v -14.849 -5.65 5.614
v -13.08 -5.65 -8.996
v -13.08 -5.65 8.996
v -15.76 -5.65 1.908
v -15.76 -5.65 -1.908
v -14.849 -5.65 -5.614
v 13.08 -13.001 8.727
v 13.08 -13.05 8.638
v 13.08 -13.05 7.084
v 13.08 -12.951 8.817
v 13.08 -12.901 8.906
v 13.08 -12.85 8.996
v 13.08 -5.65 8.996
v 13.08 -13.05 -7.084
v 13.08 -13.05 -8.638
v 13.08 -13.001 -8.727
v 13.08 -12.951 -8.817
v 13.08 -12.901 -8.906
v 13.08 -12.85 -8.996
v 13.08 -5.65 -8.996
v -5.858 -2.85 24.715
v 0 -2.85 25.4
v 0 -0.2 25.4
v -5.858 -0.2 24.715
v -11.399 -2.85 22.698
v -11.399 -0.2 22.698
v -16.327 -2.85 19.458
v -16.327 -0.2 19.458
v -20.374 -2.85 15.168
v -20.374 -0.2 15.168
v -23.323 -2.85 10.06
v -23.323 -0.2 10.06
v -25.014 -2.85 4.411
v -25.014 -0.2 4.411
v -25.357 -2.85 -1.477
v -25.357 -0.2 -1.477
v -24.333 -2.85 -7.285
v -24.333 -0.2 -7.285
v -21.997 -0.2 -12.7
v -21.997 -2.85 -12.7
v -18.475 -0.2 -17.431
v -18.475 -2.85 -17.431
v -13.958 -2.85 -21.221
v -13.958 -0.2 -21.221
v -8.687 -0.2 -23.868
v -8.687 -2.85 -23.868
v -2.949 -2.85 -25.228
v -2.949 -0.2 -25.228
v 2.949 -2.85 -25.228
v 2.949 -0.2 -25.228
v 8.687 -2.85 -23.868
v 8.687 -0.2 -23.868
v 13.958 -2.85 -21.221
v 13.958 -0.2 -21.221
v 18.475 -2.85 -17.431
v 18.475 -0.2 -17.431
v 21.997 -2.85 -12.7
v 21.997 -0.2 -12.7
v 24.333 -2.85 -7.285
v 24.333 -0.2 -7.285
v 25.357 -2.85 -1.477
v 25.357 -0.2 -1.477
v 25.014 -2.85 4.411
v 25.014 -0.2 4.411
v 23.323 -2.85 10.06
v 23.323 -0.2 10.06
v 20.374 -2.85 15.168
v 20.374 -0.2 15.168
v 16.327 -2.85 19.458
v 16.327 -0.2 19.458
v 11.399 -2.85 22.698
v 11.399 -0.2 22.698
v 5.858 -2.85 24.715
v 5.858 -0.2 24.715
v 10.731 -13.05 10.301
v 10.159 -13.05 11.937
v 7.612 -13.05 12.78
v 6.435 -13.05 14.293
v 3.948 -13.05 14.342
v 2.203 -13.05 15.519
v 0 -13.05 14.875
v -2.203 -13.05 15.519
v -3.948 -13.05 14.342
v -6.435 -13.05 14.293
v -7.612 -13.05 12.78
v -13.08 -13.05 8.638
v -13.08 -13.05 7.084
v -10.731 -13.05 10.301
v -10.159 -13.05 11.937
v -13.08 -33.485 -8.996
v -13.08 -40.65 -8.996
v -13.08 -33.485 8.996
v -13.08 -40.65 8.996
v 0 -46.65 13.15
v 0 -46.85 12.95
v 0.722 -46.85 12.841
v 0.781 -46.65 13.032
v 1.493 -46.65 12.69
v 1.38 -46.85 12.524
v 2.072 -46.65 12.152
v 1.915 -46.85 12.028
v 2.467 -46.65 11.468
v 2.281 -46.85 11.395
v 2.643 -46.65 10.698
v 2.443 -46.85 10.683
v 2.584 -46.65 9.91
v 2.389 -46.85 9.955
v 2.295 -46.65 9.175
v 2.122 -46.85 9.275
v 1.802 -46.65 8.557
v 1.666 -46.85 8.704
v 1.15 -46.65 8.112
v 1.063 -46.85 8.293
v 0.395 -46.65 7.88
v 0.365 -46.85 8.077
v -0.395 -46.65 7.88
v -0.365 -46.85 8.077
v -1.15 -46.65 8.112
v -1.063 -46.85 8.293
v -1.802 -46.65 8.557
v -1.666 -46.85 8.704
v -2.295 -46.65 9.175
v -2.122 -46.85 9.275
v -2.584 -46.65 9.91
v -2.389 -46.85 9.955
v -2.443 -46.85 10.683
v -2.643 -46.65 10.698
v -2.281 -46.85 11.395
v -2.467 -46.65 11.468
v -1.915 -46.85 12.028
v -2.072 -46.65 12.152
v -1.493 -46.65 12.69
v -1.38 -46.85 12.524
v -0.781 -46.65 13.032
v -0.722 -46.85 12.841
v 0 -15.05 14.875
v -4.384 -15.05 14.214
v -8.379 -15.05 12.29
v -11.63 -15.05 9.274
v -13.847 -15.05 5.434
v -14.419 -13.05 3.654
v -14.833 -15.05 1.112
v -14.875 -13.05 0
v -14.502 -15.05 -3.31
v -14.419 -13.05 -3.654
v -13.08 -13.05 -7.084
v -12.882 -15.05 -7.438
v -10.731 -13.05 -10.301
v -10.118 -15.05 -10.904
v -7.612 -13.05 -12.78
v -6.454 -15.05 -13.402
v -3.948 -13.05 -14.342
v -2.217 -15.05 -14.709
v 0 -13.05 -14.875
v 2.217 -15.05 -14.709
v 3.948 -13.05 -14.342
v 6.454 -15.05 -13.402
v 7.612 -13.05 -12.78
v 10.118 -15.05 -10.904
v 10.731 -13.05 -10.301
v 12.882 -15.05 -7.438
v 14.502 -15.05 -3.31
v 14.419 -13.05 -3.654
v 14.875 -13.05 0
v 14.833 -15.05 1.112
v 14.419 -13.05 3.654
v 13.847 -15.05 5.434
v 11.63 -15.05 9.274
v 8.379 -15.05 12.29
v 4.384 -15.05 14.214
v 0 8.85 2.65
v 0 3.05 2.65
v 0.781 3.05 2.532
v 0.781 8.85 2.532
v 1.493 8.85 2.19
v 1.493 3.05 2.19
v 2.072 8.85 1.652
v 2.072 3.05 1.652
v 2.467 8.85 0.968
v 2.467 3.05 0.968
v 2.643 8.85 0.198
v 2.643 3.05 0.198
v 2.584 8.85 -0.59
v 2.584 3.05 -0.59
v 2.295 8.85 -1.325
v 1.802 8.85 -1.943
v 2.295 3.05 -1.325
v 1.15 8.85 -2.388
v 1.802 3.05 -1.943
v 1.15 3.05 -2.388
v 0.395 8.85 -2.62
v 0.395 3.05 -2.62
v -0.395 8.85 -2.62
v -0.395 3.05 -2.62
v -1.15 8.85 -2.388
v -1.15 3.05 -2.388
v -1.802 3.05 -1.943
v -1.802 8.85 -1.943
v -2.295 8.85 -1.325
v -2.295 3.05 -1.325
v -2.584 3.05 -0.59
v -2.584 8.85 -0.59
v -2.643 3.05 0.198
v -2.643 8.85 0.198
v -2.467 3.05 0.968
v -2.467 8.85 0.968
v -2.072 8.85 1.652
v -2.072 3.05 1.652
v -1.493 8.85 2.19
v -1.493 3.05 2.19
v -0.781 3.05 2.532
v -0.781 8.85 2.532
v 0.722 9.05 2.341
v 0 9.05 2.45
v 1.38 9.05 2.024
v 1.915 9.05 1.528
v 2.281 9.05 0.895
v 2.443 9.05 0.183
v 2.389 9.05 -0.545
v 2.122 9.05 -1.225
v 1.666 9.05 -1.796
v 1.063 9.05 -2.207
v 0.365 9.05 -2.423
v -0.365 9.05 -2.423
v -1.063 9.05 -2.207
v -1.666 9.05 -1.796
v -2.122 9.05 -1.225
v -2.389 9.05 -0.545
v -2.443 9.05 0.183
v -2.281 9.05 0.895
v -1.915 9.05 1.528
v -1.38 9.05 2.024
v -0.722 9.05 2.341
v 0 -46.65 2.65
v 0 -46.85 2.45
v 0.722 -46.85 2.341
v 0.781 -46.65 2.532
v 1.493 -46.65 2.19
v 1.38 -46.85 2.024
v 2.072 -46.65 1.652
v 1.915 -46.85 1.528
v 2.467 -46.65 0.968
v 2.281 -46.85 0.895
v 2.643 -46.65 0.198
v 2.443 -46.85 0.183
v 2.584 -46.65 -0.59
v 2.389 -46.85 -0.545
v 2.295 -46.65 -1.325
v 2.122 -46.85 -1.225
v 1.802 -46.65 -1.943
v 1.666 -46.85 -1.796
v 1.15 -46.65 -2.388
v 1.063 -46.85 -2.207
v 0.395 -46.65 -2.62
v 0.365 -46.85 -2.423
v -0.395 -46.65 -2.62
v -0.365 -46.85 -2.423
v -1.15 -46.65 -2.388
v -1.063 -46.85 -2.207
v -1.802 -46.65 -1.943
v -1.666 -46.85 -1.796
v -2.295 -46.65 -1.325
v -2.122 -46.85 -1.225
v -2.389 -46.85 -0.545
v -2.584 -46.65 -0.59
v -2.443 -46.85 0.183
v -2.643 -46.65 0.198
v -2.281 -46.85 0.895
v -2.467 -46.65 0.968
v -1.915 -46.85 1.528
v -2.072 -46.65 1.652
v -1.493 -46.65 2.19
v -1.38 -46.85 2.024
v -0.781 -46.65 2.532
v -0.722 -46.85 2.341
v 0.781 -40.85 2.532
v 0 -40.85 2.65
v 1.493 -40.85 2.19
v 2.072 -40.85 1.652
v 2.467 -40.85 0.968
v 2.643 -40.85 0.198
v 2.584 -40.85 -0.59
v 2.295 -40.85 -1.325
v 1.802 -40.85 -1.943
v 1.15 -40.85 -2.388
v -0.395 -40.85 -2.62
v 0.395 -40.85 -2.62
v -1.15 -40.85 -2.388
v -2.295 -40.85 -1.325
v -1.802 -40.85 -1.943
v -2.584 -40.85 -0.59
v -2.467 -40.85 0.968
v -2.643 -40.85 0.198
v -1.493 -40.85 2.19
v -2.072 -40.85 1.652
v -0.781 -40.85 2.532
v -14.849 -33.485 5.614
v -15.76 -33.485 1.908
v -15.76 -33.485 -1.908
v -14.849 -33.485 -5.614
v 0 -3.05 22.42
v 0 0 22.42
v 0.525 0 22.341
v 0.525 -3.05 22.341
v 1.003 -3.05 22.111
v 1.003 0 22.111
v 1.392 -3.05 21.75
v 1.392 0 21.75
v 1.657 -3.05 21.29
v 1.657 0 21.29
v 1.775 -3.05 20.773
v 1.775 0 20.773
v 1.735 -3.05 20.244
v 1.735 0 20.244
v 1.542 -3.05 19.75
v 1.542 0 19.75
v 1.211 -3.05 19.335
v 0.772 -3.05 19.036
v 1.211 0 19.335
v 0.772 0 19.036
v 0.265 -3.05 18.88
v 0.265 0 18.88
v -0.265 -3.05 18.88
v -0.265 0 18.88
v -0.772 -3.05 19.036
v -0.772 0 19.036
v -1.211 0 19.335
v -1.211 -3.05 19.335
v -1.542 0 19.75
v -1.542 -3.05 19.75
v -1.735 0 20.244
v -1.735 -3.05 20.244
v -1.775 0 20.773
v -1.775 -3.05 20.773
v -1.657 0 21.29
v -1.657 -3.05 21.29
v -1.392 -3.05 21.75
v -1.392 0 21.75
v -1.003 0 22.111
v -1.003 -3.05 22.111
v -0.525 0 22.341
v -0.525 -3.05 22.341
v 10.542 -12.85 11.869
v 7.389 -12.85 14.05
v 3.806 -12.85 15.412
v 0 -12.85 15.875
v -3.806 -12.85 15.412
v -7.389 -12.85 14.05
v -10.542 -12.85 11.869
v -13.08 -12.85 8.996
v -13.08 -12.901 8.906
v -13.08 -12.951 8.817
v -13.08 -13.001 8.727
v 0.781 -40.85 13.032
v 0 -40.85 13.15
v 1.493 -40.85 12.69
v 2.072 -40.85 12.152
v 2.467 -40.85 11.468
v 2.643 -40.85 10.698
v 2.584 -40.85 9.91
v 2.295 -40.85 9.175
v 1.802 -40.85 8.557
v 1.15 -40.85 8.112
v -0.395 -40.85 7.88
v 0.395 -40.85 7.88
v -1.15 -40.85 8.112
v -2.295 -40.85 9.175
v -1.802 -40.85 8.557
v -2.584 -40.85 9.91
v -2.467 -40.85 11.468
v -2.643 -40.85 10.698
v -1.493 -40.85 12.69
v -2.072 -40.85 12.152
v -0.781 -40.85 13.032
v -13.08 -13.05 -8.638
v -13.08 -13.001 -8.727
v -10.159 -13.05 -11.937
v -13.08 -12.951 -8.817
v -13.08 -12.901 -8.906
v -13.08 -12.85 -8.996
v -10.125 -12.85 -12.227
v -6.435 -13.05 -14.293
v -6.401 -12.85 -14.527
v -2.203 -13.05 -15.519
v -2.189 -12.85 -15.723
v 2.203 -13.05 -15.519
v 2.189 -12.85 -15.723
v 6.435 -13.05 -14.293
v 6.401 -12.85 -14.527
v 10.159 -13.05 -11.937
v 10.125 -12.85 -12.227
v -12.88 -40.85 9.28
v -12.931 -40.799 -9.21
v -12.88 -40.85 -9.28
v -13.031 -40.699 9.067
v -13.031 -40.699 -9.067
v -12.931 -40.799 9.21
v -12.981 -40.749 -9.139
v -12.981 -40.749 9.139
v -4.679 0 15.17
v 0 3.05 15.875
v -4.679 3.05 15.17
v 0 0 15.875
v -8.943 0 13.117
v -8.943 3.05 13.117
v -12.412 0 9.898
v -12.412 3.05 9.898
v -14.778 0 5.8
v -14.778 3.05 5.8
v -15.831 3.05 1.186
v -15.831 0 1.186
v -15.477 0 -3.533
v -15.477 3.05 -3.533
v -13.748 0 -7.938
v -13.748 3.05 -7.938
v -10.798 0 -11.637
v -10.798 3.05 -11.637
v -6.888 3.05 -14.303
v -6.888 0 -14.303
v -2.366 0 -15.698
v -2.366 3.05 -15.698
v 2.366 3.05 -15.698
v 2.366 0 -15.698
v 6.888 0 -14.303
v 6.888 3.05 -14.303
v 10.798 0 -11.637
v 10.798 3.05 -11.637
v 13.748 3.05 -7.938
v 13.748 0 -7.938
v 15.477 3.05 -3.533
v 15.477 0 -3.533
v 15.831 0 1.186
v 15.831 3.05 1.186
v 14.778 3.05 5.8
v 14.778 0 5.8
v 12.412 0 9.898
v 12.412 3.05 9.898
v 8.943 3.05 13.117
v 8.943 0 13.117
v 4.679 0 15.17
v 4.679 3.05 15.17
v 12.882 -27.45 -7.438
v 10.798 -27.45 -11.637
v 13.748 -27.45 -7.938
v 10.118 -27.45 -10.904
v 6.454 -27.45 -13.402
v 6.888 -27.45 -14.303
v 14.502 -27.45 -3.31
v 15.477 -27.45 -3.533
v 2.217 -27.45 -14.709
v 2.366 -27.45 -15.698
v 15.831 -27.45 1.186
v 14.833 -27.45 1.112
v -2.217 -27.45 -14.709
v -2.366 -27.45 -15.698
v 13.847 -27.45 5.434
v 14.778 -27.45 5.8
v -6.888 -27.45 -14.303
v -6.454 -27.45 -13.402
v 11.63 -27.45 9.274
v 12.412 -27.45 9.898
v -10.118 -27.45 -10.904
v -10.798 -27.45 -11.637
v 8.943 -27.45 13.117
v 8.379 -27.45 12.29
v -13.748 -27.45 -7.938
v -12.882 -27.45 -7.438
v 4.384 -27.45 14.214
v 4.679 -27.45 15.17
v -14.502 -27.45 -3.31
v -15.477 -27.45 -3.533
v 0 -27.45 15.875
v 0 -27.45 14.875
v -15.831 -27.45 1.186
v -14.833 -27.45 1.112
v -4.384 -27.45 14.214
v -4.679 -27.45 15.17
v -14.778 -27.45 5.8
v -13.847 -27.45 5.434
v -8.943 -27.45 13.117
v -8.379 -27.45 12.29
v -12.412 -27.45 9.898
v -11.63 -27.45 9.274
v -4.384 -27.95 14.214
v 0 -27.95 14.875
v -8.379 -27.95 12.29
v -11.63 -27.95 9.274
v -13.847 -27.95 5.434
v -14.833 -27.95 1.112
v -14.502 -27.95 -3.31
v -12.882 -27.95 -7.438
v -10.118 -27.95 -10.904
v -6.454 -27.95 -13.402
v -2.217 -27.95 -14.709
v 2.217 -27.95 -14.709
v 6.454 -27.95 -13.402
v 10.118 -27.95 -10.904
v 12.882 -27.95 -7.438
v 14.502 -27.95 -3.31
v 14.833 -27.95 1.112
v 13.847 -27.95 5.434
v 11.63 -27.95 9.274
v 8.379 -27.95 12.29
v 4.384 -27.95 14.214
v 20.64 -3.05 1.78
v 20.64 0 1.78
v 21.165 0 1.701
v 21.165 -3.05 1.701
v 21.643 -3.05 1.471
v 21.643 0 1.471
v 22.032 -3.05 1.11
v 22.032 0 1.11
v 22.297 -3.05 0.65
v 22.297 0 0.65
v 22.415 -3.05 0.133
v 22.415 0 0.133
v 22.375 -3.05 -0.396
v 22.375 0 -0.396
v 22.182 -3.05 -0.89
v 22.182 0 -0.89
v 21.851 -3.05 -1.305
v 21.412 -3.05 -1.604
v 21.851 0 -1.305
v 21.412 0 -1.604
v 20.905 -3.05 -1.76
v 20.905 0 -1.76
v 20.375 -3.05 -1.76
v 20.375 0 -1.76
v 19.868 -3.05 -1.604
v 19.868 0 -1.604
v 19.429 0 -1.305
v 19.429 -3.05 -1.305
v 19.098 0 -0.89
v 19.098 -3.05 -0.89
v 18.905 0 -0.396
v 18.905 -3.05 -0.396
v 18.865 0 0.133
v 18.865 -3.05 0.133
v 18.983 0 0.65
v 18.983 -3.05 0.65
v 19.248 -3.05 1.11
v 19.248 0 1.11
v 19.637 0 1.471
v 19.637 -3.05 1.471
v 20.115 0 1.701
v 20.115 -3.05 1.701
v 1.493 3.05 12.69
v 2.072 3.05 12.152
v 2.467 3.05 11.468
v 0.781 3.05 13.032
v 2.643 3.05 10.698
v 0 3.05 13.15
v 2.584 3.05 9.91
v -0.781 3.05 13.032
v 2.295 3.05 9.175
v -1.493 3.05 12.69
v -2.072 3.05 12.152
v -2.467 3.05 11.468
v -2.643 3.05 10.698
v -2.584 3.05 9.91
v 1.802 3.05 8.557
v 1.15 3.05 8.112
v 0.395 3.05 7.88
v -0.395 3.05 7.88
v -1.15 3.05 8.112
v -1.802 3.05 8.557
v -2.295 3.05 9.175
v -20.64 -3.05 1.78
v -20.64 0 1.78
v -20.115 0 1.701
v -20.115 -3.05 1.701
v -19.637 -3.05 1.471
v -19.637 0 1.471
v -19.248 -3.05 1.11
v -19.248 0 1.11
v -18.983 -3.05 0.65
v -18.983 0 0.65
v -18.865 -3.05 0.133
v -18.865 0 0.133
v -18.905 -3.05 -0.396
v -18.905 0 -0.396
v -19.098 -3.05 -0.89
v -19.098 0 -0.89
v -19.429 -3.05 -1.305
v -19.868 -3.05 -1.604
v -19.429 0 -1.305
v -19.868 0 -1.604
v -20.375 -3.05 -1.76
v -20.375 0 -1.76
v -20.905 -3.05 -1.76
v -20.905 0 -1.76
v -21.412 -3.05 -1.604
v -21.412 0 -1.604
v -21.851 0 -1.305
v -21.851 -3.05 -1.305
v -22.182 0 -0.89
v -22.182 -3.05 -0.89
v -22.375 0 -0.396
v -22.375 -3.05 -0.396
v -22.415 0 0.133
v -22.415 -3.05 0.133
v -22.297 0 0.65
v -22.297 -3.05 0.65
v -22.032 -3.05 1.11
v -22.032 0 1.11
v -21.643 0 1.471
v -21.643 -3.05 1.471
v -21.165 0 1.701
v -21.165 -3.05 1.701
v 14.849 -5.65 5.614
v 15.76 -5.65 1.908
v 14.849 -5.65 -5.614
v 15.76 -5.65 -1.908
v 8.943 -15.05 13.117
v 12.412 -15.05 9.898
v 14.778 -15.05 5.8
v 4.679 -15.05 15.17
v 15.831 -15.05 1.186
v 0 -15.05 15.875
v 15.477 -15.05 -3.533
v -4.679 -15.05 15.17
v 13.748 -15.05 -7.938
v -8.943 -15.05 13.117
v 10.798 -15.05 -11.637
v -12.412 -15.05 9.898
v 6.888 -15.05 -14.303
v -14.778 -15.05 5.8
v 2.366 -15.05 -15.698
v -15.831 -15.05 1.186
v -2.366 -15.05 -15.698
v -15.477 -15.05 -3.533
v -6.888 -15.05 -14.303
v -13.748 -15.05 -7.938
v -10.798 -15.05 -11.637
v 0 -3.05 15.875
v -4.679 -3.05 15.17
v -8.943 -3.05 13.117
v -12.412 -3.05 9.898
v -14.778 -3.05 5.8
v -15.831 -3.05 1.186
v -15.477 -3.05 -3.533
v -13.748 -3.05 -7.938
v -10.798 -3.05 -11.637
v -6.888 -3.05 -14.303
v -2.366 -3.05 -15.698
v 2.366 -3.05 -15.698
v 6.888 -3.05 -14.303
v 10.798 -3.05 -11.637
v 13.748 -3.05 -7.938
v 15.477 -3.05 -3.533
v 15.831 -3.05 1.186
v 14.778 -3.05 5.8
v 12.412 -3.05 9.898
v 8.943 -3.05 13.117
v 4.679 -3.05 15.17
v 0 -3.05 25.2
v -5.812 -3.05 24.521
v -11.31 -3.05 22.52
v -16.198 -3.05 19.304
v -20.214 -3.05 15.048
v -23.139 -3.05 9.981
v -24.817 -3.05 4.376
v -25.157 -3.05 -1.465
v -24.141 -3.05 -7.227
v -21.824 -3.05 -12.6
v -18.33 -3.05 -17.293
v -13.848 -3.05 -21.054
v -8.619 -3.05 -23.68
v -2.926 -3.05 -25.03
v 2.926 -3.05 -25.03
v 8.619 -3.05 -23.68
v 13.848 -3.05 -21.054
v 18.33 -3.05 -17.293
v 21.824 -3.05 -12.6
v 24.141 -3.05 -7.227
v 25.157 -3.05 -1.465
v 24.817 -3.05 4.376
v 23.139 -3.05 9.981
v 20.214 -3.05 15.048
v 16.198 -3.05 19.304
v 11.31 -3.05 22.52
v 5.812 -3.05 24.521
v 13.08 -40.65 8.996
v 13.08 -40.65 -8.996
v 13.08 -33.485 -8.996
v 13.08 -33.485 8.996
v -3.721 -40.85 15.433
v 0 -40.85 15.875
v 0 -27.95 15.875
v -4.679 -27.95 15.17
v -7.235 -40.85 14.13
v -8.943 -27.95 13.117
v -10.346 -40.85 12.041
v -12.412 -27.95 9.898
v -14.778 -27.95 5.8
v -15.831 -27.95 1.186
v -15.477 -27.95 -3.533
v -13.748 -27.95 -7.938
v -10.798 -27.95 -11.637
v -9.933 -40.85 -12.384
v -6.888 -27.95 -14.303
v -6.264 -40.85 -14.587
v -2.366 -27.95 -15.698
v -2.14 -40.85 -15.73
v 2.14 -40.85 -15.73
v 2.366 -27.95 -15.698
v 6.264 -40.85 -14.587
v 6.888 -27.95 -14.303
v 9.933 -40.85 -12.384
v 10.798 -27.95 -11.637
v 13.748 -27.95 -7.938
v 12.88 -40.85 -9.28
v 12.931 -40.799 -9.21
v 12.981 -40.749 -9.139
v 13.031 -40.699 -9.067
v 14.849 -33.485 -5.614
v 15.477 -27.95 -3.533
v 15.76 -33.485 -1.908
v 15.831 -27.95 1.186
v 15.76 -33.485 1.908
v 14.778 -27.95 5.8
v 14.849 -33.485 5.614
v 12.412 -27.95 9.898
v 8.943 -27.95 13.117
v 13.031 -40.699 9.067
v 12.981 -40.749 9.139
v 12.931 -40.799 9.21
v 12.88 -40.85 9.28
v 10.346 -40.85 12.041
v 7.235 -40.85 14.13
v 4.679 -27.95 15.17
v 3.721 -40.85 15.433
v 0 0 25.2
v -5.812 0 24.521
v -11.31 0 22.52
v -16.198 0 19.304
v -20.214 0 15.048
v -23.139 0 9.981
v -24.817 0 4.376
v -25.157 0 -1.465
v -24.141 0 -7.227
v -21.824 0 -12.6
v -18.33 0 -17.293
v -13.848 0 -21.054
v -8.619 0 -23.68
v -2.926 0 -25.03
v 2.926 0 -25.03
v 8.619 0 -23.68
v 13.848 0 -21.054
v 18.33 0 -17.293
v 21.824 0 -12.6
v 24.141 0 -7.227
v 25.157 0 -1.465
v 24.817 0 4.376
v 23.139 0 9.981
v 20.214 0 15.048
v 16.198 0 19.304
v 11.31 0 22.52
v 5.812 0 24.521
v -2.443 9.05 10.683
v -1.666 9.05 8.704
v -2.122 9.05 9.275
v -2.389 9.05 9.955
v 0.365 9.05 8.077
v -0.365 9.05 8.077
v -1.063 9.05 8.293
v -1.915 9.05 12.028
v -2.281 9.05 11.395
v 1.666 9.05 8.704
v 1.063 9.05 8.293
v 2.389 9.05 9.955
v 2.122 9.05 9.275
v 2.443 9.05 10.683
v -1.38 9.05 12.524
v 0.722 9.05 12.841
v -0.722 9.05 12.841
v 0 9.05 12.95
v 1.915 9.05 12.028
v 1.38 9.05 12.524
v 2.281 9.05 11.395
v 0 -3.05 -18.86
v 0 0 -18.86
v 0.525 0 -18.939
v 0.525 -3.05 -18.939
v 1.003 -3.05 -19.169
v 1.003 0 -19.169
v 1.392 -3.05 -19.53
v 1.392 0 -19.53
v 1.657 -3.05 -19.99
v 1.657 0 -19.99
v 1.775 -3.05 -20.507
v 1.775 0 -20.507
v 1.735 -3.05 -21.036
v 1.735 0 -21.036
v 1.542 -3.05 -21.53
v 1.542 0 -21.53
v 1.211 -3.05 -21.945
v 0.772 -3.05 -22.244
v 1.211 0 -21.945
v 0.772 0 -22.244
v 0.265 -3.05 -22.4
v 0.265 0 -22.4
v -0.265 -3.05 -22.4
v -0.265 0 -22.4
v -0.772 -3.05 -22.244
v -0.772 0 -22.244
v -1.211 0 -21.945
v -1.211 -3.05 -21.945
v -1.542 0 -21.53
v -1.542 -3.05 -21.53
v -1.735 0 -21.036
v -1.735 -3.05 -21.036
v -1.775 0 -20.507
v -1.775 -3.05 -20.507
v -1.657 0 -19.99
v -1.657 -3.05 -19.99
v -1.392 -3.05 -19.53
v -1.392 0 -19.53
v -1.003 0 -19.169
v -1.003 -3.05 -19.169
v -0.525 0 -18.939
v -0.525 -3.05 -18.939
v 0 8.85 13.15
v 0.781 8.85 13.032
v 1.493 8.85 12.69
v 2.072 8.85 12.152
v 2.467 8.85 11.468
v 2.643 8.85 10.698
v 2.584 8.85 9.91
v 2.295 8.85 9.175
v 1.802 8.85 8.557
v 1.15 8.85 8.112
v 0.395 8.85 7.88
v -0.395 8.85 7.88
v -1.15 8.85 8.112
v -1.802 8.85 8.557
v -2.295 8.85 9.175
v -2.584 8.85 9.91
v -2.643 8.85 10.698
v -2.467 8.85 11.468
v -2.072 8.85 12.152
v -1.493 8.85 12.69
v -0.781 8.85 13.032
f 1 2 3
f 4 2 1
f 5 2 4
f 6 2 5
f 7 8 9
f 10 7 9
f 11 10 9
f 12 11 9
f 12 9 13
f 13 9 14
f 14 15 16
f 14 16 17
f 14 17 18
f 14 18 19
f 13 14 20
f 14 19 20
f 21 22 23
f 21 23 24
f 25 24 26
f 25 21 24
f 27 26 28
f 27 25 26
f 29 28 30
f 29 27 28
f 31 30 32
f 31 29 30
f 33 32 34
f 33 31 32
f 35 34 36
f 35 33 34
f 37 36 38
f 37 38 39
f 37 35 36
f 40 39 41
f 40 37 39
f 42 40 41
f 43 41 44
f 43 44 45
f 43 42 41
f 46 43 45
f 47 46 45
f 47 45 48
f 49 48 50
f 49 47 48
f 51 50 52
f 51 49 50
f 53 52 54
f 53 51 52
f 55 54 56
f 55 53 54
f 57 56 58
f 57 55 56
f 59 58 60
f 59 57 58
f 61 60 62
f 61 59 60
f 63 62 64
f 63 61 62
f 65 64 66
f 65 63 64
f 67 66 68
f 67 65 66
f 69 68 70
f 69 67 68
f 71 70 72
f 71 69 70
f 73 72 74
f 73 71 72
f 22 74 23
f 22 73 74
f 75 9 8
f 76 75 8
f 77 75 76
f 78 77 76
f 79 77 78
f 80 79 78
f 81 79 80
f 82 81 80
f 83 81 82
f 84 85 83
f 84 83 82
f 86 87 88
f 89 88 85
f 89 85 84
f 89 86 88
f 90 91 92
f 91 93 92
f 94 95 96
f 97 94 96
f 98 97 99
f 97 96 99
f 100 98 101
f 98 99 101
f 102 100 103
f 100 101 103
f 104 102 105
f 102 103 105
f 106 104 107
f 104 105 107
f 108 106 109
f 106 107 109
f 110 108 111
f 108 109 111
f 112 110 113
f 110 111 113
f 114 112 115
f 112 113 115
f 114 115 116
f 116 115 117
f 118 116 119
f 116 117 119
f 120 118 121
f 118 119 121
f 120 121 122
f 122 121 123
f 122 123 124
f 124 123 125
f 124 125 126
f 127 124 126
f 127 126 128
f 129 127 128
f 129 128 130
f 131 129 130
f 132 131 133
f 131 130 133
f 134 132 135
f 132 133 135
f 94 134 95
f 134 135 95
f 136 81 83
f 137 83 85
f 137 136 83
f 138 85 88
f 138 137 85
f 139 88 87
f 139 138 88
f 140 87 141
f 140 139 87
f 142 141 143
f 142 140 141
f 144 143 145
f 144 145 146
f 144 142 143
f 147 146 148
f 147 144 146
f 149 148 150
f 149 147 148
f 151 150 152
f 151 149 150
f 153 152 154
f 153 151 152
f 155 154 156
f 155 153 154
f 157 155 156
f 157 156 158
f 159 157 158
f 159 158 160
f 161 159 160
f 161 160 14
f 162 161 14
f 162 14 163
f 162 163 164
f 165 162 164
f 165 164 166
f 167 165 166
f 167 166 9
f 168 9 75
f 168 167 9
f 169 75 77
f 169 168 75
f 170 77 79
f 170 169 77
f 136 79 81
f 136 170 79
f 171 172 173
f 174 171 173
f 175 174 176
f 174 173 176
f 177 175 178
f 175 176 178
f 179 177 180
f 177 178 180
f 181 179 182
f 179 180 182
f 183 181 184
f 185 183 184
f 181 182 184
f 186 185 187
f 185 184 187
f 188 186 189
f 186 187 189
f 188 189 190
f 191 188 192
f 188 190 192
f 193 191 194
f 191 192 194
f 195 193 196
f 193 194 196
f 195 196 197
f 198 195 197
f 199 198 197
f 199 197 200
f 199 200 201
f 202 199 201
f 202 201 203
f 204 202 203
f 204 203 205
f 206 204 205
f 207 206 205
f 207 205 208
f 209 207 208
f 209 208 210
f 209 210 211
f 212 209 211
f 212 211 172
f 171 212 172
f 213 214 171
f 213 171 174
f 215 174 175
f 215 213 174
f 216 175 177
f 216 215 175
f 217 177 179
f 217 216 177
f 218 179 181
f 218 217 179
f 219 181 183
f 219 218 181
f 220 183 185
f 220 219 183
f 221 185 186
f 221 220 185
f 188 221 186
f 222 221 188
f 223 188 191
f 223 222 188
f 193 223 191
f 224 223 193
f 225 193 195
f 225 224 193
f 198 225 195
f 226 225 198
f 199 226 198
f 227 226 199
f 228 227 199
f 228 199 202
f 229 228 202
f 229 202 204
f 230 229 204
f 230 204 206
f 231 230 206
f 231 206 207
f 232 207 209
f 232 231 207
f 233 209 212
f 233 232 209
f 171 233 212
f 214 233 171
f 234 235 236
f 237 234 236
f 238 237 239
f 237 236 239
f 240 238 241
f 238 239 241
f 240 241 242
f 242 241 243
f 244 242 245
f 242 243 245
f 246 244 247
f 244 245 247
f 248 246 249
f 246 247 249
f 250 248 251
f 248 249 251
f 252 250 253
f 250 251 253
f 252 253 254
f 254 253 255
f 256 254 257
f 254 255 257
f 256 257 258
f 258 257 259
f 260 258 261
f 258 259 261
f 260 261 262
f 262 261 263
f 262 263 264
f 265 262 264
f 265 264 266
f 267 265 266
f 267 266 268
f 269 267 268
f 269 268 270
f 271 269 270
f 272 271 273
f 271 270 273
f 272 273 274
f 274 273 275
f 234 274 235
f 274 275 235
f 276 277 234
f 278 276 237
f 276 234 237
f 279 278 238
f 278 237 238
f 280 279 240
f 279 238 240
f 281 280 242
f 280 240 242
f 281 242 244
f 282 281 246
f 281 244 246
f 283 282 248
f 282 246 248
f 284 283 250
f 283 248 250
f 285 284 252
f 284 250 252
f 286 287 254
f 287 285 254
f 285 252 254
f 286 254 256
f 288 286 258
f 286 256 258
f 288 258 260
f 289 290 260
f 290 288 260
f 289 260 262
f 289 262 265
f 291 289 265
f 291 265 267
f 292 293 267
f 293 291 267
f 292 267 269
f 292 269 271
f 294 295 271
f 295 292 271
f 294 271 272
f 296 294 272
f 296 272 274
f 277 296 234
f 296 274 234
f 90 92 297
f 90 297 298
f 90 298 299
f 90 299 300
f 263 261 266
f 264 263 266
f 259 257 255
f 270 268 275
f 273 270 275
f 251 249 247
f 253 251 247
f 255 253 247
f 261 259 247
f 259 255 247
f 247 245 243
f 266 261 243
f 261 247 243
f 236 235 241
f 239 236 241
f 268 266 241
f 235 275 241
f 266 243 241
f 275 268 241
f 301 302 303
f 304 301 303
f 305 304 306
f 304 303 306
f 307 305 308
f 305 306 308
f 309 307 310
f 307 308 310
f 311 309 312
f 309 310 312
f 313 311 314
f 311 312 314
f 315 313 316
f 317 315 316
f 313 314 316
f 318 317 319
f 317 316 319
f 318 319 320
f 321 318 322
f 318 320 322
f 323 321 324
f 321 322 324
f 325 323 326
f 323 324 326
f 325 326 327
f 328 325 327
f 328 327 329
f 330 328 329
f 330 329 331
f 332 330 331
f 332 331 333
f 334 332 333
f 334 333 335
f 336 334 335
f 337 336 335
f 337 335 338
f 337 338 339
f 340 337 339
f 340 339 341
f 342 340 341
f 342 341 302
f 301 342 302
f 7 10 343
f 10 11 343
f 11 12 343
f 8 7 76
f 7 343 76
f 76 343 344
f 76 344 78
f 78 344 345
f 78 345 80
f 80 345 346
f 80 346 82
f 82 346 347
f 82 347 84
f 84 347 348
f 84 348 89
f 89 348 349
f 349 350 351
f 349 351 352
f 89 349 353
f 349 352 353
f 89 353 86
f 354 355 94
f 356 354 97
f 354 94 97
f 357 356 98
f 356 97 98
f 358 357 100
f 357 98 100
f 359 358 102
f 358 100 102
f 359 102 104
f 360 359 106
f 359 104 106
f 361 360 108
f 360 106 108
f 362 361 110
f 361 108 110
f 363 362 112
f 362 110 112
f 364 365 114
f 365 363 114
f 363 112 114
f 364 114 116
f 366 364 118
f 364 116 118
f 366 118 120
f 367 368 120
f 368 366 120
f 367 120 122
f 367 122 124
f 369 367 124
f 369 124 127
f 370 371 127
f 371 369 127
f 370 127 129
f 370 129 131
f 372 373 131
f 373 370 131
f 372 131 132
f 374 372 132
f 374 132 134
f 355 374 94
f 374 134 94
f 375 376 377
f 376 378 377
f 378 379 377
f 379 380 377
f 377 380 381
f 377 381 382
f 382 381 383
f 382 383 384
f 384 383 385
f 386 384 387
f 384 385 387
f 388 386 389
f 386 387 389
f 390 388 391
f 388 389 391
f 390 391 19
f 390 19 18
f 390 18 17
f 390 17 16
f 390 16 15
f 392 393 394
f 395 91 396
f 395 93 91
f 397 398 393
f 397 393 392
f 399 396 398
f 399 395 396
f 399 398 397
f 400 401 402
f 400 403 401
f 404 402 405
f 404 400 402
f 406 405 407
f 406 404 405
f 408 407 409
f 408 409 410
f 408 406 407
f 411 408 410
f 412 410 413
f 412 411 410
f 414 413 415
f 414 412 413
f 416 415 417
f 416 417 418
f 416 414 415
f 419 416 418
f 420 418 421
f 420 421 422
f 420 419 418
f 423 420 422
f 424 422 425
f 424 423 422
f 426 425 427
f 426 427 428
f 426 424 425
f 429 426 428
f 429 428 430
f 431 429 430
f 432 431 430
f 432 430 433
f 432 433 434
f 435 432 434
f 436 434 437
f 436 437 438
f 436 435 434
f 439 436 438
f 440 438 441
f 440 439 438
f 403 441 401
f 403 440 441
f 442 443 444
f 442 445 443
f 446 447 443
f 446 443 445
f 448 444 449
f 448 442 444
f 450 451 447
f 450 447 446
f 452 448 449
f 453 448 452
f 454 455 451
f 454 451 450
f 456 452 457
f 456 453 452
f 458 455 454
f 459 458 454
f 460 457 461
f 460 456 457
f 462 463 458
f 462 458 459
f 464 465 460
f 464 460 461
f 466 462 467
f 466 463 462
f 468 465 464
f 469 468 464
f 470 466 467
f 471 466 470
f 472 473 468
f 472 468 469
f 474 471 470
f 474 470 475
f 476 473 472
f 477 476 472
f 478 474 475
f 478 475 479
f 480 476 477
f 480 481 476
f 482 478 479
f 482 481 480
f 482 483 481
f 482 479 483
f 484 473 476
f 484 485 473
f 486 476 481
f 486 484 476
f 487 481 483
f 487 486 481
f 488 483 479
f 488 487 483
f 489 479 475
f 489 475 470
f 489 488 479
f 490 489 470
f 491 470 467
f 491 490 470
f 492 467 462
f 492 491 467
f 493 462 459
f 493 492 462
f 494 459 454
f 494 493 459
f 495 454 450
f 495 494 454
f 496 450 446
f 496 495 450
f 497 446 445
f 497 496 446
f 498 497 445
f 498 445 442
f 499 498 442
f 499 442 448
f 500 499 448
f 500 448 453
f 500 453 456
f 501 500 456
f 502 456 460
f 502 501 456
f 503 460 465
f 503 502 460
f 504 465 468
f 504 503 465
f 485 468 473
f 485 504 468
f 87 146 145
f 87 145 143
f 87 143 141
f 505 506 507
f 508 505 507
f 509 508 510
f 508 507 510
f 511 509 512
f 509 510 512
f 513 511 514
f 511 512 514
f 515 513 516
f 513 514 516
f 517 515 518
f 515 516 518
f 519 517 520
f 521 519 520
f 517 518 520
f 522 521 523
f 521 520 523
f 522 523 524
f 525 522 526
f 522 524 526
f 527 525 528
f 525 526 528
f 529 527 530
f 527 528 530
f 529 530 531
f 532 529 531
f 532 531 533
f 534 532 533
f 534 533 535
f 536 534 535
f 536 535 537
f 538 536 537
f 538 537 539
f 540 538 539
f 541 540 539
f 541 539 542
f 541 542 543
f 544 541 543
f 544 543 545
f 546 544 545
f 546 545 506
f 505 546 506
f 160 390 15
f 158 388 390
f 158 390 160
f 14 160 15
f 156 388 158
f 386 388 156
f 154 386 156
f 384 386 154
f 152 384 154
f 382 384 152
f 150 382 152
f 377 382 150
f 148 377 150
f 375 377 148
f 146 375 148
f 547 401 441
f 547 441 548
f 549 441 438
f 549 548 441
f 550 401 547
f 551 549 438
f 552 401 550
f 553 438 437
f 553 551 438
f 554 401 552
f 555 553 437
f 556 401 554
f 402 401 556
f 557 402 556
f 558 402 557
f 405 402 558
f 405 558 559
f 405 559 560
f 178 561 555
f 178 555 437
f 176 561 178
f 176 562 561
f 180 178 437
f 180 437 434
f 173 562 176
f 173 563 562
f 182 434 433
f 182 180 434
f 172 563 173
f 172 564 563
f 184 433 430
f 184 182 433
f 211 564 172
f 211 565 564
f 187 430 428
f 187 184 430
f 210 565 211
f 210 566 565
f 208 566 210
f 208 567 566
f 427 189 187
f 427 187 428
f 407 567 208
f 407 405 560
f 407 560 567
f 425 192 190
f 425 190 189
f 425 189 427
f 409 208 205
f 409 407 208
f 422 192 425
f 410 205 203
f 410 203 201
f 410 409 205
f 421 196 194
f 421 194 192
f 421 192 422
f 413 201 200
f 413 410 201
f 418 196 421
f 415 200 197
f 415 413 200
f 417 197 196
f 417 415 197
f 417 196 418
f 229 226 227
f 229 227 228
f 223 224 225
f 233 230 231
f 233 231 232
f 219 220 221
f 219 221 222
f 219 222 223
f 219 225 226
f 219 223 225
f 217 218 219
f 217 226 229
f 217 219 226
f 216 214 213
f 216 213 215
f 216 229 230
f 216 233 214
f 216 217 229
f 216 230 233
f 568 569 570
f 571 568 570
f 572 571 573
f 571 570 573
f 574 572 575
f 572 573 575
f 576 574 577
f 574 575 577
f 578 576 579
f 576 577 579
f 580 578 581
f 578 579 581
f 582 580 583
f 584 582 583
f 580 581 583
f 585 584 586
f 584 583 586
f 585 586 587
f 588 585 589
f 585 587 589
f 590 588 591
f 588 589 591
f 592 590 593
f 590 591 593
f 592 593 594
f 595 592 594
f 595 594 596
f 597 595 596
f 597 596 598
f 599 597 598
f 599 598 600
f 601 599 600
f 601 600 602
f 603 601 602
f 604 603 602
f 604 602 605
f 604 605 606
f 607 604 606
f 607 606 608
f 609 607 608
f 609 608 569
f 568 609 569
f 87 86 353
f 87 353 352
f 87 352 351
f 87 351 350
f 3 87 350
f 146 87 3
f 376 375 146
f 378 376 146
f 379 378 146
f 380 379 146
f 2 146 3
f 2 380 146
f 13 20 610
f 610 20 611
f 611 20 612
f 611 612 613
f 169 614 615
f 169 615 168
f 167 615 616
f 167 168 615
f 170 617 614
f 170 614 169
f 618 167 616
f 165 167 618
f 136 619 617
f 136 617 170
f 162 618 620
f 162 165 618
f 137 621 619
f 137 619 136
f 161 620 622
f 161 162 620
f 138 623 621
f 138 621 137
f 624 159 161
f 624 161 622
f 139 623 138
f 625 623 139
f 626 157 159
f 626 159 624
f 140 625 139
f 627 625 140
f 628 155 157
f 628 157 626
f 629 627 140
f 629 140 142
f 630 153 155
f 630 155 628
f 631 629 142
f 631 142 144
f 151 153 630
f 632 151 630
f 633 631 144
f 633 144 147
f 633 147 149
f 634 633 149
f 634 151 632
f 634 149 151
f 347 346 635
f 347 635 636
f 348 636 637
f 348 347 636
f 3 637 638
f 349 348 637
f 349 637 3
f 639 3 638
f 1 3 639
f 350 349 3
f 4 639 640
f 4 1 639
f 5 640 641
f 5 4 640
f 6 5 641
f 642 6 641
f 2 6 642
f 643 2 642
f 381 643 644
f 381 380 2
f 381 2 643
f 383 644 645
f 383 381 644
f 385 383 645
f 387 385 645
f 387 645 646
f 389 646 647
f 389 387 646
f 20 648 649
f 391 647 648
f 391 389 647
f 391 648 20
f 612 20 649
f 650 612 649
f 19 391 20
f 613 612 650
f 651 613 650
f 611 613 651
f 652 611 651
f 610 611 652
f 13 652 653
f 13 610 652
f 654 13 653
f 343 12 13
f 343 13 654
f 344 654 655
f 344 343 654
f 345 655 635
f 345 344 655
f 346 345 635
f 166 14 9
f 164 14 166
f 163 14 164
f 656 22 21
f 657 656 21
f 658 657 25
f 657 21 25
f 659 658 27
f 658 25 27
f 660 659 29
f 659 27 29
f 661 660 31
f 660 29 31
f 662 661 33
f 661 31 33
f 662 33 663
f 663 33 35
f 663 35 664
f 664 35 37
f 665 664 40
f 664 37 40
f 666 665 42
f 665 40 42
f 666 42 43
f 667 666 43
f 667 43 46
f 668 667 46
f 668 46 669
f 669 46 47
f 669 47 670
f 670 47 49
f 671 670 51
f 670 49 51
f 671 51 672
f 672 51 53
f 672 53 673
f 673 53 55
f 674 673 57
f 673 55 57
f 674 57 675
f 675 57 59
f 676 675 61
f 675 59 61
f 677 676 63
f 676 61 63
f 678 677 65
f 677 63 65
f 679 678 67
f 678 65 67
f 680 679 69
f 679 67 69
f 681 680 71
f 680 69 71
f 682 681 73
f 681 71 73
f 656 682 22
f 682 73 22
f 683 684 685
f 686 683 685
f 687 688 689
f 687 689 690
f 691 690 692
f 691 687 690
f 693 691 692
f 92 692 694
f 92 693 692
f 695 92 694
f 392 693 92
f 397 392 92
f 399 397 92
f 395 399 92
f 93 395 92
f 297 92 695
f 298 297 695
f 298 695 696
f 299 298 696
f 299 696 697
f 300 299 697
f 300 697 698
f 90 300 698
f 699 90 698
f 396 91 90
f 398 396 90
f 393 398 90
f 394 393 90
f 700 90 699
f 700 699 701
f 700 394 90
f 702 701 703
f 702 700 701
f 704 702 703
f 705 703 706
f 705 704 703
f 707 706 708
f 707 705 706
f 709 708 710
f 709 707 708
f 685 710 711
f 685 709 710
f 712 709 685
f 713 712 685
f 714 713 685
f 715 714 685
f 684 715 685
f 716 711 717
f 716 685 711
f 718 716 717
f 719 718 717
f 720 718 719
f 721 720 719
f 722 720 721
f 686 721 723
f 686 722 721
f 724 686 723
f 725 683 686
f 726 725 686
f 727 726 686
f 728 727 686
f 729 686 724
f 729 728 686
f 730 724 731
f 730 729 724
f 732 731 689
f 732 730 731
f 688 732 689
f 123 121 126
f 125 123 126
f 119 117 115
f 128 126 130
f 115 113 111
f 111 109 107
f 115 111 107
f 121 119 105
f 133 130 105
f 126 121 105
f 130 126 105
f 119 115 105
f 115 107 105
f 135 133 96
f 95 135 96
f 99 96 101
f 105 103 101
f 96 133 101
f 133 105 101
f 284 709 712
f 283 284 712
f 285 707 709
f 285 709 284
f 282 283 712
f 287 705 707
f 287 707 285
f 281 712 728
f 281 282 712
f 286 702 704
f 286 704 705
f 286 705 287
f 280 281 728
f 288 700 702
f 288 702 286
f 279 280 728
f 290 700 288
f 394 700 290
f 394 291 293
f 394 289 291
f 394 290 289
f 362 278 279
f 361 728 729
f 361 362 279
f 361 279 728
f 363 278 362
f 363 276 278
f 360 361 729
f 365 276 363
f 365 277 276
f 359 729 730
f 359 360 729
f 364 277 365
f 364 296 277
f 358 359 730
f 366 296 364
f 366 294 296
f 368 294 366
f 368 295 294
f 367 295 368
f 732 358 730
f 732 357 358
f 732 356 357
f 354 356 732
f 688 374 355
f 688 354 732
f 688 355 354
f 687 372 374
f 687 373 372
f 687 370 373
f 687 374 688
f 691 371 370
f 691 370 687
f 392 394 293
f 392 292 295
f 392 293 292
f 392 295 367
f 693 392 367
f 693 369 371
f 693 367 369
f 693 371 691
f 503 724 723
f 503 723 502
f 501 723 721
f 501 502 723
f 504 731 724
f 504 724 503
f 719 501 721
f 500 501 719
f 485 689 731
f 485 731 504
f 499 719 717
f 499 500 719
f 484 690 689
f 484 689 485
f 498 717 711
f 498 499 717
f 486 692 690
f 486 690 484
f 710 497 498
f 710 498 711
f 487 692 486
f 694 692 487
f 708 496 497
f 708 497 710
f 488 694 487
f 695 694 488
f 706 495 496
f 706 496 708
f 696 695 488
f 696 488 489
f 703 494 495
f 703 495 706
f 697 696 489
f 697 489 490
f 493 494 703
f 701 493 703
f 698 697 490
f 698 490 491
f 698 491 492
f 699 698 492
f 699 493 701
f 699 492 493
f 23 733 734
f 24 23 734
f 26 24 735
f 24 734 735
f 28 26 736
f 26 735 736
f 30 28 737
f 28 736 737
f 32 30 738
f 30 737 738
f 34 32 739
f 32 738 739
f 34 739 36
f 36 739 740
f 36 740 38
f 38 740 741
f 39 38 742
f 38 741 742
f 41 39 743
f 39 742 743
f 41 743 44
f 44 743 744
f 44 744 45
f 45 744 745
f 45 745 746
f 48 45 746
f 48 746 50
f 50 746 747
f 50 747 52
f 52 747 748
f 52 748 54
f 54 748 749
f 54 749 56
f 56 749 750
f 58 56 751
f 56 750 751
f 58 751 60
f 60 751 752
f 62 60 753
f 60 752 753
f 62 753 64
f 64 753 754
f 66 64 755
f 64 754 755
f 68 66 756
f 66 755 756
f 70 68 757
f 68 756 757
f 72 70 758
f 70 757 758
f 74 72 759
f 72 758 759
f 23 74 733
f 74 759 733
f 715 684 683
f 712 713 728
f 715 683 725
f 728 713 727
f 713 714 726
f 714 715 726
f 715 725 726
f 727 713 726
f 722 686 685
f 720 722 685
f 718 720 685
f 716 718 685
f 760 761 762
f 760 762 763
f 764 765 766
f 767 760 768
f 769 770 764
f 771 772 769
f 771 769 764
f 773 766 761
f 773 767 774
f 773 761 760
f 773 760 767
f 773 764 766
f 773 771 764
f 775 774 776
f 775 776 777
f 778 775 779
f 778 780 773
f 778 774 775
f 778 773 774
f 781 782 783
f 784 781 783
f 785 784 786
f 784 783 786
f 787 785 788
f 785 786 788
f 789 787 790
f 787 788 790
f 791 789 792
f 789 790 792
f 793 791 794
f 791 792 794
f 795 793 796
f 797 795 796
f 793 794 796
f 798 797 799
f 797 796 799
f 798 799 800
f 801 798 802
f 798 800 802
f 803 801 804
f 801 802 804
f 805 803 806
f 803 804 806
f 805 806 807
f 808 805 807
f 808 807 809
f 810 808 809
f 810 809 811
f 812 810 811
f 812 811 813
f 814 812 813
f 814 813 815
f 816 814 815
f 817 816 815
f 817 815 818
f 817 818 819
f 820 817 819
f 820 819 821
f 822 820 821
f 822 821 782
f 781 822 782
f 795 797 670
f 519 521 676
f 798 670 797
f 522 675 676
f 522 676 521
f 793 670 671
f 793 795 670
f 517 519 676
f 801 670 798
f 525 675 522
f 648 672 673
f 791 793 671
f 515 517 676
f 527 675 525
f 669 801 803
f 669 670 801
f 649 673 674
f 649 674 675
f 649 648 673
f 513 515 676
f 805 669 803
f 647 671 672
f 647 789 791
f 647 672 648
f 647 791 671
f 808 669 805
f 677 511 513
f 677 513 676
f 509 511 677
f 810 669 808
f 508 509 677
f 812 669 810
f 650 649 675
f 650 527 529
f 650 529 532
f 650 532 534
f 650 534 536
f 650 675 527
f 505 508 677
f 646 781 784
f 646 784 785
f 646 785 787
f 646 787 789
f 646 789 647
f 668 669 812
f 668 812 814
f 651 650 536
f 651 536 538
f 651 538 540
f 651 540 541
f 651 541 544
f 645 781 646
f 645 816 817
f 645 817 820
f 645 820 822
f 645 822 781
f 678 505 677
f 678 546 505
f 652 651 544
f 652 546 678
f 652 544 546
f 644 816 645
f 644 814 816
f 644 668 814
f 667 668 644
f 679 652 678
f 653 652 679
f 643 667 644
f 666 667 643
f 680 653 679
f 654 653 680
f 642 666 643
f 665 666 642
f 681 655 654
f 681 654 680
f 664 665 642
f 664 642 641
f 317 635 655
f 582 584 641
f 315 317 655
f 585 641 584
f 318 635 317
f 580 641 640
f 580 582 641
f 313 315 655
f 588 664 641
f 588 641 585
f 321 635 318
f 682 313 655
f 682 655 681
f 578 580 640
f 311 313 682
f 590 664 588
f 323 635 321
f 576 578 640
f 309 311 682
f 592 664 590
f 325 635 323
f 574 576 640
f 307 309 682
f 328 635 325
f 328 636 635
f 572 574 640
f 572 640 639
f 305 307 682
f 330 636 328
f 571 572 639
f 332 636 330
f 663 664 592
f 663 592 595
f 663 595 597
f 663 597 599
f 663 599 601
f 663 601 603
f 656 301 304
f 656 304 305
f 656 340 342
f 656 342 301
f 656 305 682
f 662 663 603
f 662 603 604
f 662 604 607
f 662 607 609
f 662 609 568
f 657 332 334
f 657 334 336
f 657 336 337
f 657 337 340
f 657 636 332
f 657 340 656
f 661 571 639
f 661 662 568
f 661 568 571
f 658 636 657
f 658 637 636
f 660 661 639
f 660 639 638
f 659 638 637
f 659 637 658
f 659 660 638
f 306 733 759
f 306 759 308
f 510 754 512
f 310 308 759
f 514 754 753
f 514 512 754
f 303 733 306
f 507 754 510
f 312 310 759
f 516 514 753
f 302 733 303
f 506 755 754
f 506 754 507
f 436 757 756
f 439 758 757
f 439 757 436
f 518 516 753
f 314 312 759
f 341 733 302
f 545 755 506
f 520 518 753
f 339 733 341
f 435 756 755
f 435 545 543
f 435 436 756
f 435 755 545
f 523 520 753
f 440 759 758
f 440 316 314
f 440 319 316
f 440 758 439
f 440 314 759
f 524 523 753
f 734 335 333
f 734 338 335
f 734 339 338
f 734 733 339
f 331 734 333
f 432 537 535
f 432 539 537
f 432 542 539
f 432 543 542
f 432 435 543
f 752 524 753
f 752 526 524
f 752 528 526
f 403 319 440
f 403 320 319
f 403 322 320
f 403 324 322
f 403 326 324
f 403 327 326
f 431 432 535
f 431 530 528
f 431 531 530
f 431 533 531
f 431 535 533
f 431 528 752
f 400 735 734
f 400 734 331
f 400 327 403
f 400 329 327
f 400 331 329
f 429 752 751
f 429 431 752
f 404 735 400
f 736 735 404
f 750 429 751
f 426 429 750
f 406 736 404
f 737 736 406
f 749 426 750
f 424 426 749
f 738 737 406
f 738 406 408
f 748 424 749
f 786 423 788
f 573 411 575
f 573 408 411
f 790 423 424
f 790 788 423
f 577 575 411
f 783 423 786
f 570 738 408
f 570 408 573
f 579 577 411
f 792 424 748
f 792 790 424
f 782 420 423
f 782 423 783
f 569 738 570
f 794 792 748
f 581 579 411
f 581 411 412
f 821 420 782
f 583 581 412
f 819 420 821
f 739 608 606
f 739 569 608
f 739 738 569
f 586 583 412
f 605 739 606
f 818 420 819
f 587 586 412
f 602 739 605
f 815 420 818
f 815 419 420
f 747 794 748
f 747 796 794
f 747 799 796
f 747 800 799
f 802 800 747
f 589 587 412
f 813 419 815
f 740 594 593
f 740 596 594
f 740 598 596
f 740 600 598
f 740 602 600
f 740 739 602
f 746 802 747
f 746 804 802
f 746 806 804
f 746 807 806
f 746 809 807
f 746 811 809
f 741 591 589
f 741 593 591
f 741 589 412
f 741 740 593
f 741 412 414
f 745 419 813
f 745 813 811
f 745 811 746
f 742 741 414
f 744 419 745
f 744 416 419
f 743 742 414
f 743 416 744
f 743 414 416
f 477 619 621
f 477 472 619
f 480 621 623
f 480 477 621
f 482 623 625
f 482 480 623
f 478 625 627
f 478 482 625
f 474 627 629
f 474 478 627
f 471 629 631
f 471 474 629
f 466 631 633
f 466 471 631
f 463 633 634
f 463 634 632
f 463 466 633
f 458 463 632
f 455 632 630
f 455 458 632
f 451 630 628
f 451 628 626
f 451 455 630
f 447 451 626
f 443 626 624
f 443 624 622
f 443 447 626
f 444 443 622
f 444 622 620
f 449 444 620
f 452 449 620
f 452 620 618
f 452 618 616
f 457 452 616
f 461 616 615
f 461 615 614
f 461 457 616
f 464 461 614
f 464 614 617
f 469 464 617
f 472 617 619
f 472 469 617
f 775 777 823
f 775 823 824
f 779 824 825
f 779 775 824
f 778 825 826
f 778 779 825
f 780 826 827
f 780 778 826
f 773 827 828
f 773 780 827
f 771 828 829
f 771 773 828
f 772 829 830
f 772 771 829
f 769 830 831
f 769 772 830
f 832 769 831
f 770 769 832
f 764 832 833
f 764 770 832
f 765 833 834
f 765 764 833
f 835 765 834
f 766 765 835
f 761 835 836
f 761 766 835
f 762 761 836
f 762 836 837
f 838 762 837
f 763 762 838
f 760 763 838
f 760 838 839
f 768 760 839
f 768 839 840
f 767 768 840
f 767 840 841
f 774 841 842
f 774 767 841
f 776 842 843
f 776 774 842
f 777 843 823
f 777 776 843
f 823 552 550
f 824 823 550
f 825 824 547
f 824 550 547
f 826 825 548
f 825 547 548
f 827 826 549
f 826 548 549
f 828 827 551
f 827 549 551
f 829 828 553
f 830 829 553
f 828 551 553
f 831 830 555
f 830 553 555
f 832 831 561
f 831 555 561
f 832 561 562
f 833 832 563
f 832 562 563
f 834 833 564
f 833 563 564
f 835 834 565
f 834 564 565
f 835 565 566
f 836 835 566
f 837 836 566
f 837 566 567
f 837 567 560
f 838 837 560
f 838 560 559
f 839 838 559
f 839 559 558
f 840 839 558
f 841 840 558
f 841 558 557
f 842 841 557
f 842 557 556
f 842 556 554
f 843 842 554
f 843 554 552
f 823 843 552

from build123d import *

# Parameters (mm, degrees)
BOSS_EXTRUDE1_DEPTH      = 6
BOSS_EXTRUDE1_DEPTH_BACK = 49.9
SKETCH2_R                = 2.65
SKETCH3_R                = 1.78
CUT_EXTRUDE1_DEPTH       = 6
SKETCH4_W                = 5.711822604
SKETCH4_H                = 7.4
CUT_EXTRUDE2_DEPTH       = 60.035942442
CHAMFER1_SIZE            = 0.2


with BuildPart() as part:
    # Sketch1 → Revolve1 (revolve)
    with BuildSketch(Plane.XY, mode=Mode.PRIVATE) as revolve1_sk:
        Polygon((0, 3.05), (-15.875, 3.05), (-15.875, 0), (-25.4, 0), (-25.4, -3.05), (-15.875, -3.05), (-15.875, -13.05), (-14.875, -13.05), (-14.875, -15.05), (-15.875, -15.05), (-15.875, -27.45), (-14.875, -27.45), (-14.875, -27.95), (-15.875, -27.95), (-15.875, -40.85), (0, -40.85), align=None)
    revolve(revolve1_sk.sketch.rotate(Axis((0, 50.719281348, 0), (0, -1, 0)), 270), axis=Axis((0, 50.719281348, 0), (0, -1, 0)))

    # Sketch2 → Boss-Extrude1 (add, two sides: drawn at the far end of the back side and taken through both)
    with BuildSketch(Plane(origin=(0, 3.05, 0), x_dir=(1, 0, 0), z_dir=(0, 1, 0)).offset(-BOSS_EXTRUDE1_DEPTH_BACK)):
        with Locations(Location((0, 0, 0), (0, 0, 270))):
            Circle(SKETCH2_R)
        with Locations(Location((0, -10.5, 0), (0, 0, 270))):
            Circle(SKETCH2_R)
    extrude(amount=BOSS_EXTRUDE1_DEPTH + BOSS_EXTRUDE1_DEPTH_BACK)

    # Sketch3 → Cut-Extrude1 (cut)
    with BuildSketch(Plane(origin=(0, 0, 0), x_dir=(1, 0, 0), z_dir=(0, 1, 0))):
        with Locations(Location((0, 20.64, 0), (0, 0, 270))):
            Circle(SKETCH3_R)
        with Locations(Location((-20.64, 0, 0), (0, 0, 270))):
            Circle(SKETCH3_R)
        with Locations(Location((0, -20.64, 0), (0, 0, 270))):
            Circle(SKETCH3_R)
        with Locations(Location((20.64, 0, 0), (0, 0, 270))):
            Circle(SKETCH3_R)
    extrude(amount=-CUT_EXTRUDE1_DEPTH, mode=Mode.SUBTRACT)

    # Sketch4 → Cut-Extrude2 (cut, symmetric)
    with BuildSketch(Plane.XY):
        with Locations((-15.935911302, -9.35)):
            Rectangle(SKETCH4_W, SKETCH4_H)
        with Locations((-15.935911302, -37.184964336)):
            Rectangle(SKETCH4_W, SKETCH4_H)
    cut_extrude2 = extrude(amount=CUT_EXTRUDE2_DEPTH, both=True, mode=Mode.SUBTRACT)

    # Mirror1: Cut-Extrude2 across plane
    add(cut_extrude2.mirror(Plane(origin=(0, 0, 0), x_dir=(0, 0, 1), z_dir=(1, 0, 0))), mode=Mode.SUBTRACT)

    # Chamfer1
    chamfer1_edges = [part.edges().sort_by_distance(p)[0] for p in [
        (13.08, -40.85, 0),
        (0, -13.05, -15.875),
        (0, -3.05, -25.4),
        (0, 0, -25.4),
        (0, -46.85, -2.65),
        (0, 9.05, -2.65),
        (0, -46.85, 7.85),
        (0, 9.05, 7.85),
        (-13.08, -40.85, 0),
        (-7.389284751, -13.05, 14.050412658),
    ]]
    chamfer(chamfer1_edges, length=CHAMFER1_SIZE)


solid = part.part
